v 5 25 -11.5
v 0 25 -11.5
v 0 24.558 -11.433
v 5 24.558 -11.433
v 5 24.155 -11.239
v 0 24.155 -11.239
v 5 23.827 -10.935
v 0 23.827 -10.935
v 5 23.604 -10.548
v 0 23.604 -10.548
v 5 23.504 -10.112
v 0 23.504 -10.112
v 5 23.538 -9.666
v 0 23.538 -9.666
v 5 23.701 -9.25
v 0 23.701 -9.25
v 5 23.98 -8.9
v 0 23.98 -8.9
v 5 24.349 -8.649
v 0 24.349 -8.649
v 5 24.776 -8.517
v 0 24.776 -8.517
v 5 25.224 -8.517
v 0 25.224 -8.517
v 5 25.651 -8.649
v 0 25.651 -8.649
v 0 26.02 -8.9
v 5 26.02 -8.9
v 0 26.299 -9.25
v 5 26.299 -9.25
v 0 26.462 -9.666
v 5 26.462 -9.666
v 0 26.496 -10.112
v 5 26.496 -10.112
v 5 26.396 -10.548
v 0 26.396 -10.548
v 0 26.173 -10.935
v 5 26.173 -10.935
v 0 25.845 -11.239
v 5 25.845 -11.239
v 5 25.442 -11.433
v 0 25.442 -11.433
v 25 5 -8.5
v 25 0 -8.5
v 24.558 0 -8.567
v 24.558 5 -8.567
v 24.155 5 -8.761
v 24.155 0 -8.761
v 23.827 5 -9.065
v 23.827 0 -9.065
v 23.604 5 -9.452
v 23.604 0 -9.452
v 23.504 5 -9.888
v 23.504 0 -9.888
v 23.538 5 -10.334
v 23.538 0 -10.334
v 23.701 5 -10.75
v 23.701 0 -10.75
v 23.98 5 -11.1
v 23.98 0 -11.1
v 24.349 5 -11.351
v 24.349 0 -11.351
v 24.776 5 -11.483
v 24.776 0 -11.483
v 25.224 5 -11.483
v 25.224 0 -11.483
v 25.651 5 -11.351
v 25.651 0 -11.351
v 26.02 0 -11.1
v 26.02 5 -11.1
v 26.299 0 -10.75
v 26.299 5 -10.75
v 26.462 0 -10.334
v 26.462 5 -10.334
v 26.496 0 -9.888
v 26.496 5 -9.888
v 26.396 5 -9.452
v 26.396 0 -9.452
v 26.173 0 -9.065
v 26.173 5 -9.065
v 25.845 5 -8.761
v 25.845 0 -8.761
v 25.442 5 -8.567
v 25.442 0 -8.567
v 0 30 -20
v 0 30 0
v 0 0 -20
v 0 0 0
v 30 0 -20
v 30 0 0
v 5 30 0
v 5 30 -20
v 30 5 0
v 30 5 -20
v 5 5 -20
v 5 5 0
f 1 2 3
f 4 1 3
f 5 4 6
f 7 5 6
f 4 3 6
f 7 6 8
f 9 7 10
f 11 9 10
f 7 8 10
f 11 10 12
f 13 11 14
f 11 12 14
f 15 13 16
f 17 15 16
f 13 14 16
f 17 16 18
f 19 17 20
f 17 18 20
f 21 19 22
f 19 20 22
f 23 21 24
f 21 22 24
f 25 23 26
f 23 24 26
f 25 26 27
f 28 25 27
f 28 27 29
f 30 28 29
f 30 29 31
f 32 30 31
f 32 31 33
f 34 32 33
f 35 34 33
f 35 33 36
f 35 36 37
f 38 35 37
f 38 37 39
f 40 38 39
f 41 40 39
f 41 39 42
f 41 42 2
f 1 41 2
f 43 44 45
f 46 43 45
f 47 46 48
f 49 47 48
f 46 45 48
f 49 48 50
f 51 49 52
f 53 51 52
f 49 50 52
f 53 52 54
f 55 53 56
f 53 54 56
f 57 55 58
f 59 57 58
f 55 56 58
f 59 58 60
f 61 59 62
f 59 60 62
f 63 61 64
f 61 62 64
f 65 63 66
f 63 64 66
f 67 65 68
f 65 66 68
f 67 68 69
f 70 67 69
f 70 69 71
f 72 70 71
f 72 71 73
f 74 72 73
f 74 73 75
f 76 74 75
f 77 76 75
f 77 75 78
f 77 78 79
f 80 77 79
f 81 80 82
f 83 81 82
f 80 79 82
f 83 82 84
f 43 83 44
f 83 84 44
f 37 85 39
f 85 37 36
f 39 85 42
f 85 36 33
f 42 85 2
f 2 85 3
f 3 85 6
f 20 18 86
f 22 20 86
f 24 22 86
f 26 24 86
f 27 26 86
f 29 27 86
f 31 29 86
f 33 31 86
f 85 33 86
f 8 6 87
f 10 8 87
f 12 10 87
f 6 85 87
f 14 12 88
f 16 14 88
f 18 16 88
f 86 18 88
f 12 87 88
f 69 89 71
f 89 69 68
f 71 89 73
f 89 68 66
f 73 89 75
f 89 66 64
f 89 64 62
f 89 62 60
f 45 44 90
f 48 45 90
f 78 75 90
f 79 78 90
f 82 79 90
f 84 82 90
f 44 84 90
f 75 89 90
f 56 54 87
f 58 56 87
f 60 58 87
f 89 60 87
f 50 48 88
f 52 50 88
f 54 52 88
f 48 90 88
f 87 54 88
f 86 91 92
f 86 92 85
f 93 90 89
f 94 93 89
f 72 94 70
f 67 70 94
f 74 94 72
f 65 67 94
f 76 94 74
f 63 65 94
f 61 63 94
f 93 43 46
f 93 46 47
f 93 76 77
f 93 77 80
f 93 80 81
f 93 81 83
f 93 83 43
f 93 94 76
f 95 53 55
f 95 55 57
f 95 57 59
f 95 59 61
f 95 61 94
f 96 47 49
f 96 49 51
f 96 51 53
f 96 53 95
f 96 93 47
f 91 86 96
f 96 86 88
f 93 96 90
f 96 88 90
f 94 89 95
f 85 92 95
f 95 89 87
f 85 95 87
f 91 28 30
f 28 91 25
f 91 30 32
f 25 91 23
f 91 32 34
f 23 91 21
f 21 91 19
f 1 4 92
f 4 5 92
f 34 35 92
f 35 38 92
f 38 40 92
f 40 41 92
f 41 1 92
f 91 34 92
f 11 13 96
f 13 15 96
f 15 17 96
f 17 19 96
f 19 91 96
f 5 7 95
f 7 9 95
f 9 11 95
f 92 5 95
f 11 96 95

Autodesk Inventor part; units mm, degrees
ref_plane "YZ Plane" through (0, 0, 0) normal (1, 0, 0) x (0, 1, 0)
ref_plane "XZ Plane" through (0, 0, 0) normal (0, 1, 0) x (-1, 0, 0)
ref_plane "XY Plane" through (0, 0, 0) normal (0, 0, 1) x (1, 0, 0)
sketch "Sketch1" plane through (0, 0, 0) normal (0, 1, 0) x (-1, 0, 0)
  line L0 (0, 0) -> (-30, 0)
  line L1 (-30, 0) -> (-30, -20)
  line L2 (-30, -20) -> (0, -20)
  line L3 (0, -20) -> (0, 0)
  line L4 (0, 0) -> (-5, 0)
  line L5 (-15, -20) -> (0, -20)
  line L6 (0, -20) -> (0, 0)
  line L7 (-5, 0) -> (-5, -20)
  point P0 (-5, -20)
  dimension "d1" = 20
  dimension "d7" = 5
  dimension "d8" = 25
extrude "Extrusion1" add sketch "Sketch1" along normal blind 30 contours L3 L2 L7 L0
extrude "Extrusion3" add sketch "Sketch1" along normal blind 5 contours L7 L2 L1 L0
sketch "Sketch2" plane through (0, 5, 0) normal (0, 1, 0) x (1, 0, 0)
  line L0 (5, 0) -> (5, 20) projected
  line L1 (5, 0) -> (30, 0) projected
  point P0 (0, 0)
  point P1 (25, 10)
  dimension "d18" = 20
  dimension "d21" = 10
hole "Hole1" at (25, 5, -10) direction (0, -1, 0) diameter 3 end through all
sketch "Sketch3" plane through (5, 30, 0) normal (1, 0, 0) x (0, 0, -1)
  line L0 (20, -25) -> (20, 0) projected
  line L1 (0, 0) -> (20, 0) projected
  line L2 (0, -25) -> (20, -25) projected
  point P0 (0, -30)
  point P1 (10, -5)
  point P2 (20, -12.5)
  dimension "d30" = 10
  dimension "d32" = 20
hole "Hole2" at (5, 25, -10) direction (-1, 0, 0) diameter 3 end through all
properties part number "Fastener" material "ABS Plastic"
